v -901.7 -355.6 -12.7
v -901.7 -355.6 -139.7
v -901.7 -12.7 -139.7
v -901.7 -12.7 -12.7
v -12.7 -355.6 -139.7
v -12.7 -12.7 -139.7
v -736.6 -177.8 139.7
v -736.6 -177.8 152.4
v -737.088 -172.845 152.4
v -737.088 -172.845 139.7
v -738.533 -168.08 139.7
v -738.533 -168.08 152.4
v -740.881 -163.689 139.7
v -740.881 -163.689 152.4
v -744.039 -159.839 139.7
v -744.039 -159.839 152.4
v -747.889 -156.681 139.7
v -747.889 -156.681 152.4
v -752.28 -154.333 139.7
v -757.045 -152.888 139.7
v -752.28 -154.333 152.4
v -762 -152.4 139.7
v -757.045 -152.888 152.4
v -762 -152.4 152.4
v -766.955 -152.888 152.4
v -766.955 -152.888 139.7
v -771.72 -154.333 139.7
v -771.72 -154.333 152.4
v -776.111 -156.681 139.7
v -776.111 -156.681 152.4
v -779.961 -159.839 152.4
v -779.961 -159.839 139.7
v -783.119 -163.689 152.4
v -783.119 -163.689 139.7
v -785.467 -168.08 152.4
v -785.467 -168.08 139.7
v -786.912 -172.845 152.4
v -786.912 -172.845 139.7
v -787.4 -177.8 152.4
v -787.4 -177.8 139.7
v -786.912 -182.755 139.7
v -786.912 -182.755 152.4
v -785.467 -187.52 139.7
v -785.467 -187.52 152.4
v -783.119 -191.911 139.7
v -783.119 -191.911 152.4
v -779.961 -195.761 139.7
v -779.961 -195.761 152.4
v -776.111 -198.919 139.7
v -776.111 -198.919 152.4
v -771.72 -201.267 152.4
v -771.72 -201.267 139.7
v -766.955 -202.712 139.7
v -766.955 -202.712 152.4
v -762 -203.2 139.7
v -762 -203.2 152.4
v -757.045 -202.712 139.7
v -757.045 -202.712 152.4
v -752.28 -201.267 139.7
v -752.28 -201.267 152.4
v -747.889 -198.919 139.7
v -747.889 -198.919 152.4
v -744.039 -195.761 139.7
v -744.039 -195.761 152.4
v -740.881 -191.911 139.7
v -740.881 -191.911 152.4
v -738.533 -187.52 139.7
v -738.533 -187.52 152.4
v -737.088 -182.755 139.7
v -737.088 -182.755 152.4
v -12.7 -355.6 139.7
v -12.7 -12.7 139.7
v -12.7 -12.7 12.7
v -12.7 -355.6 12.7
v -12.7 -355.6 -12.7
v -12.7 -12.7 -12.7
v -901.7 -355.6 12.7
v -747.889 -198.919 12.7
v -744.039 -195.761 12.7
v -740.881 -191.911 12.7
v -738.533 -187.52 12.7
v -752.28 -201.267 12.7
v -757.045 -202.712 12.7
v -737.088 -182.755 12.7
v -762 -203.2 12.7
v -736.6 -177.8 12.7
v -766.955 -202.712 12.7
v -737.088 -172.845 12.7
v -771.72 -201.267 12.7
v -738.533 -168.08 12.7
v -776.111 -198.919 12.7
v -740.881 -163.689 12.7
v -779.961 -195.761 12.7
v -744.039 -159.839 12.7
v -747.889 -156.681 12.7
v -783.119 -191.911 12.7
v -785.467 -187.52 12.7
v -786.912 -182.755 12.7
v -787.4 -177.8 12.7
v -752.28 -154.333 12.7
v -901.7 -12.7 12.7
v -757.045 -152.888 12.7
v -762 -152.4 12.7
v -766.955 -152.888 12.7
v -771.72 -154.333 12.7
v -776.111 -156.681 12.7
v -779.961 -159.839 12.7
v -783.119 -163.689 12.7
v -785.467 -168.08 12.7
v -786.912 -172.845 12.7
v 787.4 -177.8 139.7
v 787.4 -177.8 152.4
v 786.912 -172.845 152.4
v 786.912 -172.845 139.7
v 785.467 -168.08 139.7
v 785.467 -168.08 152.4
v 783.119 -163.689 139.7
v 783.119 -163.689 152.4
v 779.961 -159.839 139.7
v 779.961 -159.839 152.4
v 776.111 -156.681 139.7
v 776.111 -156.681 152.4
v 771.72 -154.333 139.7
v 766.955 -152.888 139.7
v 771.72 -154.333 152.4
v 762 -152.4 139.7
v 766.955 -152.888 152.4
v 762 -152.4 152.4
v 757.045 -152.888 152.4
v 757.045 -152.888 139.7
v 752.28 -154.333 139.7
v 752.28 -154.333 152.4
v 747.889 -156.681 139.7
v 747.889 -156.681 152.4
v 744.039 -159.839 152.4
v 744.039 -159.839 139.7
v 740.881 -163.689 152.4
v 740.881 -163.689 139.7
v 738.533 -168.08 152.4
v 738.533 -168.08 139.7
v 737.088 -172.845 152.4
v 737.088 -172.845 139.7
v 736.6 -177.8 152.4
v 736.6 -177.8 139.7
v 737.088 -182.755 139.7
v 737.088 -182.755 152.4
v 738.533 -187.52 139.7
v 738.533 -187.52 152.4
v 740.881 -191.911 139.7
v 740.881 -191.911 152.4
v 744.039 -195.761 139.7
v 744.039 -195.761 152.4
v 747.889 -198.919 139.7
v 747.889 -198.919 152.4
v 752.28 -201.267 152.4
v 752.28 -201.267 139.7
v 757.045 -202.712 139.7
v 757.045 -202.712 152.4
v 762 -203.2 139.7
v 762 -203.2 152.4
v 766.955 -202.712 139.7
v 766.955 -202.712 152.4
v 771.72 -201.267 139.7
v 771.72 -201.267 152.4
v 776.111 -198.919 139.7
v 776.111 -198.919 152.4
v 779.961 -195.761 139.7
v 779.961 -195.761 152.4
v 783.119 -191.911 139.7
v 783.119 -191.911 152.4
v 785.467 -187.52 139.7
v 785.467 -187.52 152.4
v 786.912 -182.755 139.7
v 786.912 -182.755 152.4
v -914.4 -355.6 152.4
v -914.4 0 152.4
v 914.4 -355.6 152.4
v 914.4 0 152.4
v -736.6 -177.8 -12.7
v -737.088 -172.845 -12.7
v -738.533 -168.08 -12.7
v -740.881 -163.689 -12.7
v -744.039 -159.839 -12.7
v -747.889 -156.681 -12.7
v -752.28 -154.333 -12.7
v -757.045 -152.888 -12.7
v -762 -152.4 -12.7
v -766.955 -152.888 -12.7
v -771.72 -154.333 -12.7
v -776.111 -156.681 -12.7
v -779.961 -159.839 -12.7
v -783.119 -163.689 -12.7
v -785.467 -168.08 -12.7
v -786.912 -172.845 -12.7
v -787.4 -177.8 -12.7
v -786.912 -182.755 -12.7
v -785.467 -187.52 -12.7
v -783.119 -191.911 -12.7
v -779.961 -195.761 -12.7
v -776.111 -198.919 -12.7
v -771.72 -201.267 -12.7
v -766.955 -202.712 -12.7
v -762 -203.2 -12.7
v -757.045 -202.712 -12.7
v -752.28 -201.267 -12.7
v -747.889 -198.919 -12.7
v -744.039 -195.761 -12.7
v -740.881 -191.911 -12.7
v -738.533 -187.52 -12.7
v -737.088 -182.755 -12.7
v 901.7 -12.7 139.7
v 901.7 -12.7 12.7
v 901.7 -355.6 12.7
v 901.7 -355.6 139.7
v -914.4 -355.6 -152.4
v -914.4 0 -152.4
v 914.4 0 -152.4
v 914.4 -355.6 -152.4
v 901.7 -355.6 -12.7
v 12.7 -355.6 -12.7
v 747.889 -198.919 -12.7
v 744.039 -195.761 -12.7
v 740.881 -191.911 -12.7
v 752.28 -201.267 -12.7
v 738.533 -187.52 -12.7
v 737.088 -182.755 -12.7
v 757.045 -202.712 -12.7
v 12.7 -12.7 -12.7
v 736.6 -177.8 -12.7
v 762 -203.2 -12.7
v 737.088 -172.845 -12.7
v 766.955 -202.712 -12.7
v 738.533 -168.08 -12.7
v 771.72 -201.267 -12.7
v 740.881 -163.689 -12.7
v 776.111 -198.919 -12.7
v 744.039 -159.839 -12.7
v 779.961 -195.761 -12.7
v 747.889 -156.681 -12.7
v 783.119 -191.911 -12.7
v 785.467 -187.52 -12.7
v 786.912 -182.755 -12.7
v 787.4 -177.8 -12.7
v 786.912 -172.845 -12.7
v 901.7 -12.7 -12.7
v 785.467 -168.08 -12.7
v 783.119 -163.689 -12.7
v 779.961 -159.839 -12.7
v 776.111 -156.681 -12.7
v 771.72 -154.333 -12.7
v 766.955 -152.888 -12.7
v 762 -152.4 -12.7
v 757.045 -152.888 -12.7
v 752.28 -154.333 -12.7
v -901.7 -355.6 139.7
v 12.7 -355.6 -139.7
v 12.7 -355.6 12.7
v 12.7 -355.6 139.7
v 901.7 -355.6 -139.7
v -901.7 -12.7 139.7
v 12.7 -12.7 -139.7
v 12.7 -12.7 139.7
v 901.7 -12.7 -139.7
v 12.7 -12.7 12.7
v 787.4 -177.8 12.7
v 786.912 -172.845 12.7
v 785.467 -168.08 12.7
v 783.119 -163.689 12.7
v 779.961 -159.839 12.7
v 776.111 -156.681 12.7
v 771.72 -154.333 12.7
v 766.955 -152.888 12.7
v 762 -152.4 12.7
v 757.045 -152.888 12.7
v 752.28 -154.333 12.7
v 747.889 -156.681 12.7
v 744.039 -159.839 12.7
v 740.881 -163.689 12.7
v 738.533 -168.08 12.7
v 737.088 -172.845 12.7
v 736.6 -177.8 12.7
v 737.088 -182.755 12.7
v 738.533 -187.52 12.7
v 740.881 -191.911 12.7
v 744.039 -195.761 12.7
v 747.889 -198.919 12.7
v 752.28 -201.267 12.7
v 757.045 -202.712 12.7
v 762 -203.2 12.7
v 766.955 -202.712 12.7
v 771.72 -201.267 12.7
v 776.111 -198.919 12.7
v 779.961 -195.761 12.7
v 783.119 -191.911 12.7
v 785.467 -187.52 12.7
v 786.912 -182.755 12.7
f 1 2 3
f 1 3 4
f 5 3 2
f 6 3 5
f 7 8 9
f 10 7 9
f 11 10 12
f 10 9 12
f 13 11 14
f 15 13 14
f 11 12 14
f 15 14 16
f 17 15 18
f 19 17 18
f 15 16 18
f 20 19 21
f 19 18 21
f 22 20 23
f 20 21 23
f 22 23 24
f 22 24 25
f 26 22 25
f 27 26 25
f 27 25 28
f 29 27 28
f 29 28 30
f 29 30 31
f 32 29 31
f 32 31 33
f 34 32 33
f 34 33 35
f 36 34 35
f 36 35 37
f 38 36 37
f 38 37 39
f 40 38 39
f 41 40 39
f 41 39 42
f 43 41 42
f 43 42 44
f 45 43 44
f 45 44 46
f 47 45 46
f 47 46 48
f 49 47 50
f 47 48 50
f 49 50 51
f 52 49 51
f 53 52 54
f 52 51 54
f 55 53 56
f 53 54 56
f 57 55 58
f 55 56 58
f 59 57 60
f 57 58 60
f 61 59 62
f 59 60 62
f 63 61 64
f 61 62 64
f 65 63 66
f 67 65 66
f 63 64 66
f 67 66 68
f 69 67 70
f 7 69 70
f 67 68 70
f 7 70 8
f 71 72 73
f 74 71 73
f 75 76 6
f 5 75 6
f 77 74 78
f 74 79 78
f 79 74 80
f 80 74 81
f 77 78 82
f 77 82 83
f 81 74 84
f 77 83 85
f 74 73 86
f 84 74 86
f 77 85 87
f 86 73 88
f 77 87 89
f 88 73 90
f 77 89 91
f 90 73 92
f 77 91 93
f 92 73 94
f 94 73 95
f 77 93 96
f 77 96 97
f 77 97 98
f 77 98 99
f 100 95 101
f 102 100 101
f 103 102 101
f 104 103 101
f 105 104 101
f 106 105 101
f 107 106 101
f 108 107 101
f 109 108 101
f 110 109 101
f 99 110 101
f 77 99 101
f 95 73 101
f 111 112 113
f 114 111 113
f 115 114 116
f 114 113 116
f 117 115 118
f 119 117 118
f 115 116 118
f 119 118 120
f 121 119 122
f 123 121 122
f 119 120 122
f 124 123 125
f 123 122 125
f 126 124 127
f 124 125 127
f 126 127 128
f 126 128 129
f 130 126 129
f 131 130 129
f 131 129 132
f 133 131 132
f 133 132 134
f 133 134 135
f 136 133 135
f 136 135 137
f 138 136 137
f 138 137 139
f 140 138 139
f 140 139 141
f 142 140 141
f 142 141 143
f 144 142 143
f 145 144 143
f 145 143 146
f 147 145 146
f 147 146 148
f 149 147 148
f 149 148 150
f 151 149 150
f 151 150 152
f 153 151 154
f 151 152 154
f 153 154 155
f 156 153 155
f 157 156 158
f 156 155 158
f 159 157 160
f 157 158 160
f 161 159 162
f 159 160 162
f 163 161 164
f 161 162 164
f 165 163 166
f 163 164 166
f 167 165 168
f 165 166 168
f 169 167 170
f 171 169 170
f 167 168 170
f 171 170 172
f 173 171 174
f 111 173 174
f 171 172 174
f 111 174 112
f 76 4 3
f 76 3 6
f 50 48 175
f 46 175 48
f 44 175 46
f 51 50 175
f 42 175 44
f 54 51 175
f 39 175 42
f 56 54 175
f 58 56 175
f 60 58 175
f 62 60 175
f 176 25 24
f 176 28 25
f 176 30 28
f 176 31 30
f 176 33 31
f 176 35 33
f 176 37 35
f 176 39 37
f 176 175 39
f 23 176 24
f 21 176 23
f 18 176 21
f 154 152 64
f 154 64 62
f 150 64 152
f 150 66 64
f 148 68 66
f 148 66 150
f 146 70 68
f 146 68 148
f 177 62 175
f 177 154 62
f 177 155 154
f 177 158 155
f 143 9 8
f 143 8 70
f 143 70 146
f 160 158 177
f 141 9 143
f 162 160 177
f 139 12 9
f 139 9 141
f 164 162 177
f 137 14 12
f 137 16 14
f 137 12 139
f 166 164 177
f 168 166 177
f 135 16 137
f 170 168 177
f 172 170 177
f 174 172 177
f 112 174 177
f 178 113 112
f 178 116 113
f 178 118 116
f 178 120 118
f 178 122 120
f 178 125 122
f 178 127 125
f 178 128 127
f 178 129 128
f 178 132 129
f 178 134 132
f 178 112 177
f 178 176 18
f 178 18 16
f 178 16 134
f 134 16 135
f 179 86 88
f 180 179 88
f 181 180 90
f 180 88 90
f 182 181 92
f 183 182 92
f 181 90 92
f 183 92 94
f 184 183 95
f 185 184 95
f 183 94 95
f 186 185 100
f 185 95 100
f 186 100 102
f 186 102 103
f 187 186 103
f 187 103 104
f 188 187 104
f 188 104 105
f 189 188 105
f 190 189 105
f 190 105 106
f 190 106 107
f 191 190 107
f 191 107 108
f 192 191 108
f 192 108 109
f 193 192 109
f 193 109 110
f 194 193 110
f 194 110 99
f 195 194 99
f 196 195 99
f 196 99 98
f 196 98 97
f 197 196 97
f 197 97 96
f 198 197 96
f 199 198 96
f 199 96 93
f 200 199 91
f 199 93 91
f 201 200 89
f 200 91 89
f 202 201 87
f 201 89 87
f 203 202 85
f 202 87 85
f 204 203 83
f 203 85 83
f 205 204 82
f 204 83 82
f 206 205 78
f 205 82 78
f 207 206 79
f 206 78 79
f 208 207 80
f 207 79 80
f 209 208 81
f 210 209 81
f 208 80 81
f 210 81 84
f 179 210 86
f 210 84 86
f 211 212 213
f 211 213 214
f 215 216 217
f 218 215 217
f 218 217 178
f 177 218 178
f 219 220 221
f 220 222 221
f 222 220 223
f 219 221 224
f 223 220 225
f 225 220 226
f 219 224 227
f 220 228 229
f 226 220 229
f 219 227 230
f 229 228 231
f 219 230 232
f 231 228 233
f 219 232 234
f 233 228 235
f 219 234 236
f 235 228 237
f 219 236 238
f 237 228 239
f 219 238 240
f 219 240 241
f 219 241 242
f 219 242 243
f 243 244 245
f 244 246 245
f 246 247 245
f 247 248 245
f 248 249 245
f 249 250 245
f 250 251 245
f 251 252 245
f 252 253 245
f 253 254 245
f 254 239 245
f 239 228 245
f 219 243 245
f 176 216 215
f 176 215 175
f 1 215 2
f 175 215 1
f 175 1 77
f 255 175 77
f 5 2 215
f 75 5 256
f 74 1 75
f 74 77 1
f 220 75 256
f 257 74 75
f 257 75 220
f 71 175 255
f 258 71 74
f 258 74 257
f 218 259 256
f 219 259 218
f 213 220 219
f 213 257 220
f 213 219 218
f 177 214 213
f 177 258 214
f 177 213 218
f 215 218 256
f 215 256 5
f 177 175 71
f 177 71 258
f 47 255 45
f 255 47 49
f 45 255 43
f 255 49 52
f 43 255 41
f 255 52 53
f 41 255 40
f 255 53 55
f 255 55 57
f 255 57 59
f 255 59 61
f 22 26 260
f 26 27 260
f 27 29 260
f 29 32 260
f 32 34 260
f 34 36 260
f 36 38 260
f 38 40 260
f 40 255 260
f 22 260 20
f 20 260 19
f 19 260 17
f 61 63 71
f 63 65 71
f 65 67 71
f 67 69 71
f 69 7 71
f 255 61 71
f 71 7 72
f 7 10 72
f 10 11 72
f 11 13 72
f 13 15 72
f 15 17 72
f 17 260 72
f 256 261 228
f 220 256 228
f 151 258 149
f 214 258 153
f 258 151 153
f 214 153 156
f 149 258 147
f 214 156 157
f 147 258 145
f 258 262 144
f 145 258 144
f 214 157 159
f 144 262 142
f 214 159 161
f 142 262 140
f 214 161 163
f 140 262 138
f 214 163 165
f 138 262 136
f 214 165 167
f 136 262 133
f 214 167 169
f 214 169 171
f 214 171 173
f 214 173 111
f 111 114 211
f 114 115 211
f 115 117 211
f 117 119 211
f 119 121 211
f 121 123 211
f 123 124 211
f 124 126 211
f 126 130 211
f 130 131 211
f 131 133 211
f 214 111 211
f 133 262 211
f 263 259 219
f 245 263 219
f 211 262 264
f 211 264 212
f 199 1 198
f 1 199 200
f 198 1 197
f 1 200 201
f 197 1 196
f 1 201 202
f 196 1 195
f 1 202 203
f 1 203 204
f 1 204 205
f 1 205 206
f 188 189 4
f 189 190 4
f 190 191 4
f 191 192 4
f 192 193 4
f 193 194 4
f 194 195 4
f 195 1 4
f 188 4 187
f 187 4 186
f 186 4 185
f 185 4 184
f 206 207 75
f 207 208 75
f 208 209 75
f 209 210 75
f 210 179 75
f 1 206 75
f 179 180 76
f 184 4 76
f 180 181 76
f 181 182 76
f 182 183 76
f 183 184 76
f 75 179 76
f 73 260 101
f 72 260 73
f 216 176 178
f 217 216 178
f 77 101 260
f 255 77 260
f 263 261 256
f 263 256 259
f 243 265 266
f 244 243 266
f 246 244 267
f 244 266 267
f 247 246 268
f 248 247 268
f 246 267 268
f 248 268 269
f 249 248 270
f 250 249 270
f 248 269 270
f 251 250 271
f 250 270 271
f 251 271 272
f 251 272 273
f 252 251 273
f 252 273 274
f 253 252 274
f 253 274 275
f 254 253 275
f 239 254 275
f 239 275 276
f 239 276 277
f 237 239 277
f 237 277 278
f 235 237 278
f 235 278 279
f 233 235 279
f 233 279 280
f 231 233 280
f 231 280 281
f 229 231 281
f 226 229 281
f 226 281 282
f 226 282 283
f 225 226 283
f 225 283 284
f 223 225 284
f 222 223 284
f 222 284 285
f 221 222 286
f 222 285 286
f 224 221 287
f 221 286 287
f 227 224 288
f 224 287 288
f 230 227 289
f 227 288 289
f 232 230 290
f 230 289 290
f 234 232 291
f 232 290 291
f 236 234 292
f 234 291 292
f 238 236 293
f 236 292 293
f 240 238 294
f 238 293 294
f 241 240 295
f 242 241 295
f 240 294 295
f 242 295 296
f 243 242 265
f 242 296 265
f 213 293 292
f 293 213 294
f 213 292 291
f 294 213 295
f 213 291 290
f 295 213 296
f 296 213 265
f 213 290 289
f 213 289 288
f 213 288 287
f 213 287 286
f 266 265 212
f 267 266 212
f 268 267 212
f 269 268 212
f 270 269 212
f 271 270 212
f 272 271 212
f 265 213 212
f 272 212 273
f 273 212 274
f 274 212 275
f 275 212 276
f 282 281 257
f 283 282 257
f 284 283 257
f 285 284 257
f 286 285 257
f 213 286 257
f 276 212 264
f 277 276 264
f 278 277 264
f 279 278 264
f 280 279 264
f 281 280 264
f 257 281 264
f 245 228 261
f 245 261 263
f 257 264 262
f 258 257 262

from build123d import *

# Parameters (mm, degrees)
F0_W     = 1828.8
F0_H     = 304.8
F1_DEPTH = 355.6
F2_T     = -12.7
F4_DEPTH = 342.9
F5_R     = 25.4
F6_DEPTH = 190.5


with BuildPart() as f1:
    # F0 (on Front) → F1 (new body)
    with BuildSketch(Plane.XZ):
        Rectangle(F0_W, F0_H)
    extrude(amount=F1_DEPTH)

    # F2
    f2_openings = [f1.faces().sort_by_distance(p)[0] for p in [
        (0, -355.6, 0),
    ]]
    offset(amount=F2_T, openings=f2_openings)

    # F3 (on face) → F4 (join)
    with BuildSketch(Plane.XZ.offset(12.7)):
        Polygon((12.7, 12.7), (12.7, 139.7), (-12.7, 139.7), (-12.7, 12.7), (-901.7, 12.7), (-901.7, -12.7), (-12.7, -12.7), (-12.7, -139.7), (12.7, -139.7), (12.7, -12.7), (901.7, -12.7), (901.7, 12.7), align=None)
    extrude(amount=F4_DEPTH)

    # F5 (on face) → F6 (cut)
    with BuildSketch(Plane.XY.offset(152.4)):
        with Locations((-762, -177.8)):
            Circle(F5_R)
        with Locations((762, -177.8)):
            Circle(F5_R)
    extrude(amount=-F6_DEPTH, mode=Mode.SUBTRACT)


solid = f1.part
